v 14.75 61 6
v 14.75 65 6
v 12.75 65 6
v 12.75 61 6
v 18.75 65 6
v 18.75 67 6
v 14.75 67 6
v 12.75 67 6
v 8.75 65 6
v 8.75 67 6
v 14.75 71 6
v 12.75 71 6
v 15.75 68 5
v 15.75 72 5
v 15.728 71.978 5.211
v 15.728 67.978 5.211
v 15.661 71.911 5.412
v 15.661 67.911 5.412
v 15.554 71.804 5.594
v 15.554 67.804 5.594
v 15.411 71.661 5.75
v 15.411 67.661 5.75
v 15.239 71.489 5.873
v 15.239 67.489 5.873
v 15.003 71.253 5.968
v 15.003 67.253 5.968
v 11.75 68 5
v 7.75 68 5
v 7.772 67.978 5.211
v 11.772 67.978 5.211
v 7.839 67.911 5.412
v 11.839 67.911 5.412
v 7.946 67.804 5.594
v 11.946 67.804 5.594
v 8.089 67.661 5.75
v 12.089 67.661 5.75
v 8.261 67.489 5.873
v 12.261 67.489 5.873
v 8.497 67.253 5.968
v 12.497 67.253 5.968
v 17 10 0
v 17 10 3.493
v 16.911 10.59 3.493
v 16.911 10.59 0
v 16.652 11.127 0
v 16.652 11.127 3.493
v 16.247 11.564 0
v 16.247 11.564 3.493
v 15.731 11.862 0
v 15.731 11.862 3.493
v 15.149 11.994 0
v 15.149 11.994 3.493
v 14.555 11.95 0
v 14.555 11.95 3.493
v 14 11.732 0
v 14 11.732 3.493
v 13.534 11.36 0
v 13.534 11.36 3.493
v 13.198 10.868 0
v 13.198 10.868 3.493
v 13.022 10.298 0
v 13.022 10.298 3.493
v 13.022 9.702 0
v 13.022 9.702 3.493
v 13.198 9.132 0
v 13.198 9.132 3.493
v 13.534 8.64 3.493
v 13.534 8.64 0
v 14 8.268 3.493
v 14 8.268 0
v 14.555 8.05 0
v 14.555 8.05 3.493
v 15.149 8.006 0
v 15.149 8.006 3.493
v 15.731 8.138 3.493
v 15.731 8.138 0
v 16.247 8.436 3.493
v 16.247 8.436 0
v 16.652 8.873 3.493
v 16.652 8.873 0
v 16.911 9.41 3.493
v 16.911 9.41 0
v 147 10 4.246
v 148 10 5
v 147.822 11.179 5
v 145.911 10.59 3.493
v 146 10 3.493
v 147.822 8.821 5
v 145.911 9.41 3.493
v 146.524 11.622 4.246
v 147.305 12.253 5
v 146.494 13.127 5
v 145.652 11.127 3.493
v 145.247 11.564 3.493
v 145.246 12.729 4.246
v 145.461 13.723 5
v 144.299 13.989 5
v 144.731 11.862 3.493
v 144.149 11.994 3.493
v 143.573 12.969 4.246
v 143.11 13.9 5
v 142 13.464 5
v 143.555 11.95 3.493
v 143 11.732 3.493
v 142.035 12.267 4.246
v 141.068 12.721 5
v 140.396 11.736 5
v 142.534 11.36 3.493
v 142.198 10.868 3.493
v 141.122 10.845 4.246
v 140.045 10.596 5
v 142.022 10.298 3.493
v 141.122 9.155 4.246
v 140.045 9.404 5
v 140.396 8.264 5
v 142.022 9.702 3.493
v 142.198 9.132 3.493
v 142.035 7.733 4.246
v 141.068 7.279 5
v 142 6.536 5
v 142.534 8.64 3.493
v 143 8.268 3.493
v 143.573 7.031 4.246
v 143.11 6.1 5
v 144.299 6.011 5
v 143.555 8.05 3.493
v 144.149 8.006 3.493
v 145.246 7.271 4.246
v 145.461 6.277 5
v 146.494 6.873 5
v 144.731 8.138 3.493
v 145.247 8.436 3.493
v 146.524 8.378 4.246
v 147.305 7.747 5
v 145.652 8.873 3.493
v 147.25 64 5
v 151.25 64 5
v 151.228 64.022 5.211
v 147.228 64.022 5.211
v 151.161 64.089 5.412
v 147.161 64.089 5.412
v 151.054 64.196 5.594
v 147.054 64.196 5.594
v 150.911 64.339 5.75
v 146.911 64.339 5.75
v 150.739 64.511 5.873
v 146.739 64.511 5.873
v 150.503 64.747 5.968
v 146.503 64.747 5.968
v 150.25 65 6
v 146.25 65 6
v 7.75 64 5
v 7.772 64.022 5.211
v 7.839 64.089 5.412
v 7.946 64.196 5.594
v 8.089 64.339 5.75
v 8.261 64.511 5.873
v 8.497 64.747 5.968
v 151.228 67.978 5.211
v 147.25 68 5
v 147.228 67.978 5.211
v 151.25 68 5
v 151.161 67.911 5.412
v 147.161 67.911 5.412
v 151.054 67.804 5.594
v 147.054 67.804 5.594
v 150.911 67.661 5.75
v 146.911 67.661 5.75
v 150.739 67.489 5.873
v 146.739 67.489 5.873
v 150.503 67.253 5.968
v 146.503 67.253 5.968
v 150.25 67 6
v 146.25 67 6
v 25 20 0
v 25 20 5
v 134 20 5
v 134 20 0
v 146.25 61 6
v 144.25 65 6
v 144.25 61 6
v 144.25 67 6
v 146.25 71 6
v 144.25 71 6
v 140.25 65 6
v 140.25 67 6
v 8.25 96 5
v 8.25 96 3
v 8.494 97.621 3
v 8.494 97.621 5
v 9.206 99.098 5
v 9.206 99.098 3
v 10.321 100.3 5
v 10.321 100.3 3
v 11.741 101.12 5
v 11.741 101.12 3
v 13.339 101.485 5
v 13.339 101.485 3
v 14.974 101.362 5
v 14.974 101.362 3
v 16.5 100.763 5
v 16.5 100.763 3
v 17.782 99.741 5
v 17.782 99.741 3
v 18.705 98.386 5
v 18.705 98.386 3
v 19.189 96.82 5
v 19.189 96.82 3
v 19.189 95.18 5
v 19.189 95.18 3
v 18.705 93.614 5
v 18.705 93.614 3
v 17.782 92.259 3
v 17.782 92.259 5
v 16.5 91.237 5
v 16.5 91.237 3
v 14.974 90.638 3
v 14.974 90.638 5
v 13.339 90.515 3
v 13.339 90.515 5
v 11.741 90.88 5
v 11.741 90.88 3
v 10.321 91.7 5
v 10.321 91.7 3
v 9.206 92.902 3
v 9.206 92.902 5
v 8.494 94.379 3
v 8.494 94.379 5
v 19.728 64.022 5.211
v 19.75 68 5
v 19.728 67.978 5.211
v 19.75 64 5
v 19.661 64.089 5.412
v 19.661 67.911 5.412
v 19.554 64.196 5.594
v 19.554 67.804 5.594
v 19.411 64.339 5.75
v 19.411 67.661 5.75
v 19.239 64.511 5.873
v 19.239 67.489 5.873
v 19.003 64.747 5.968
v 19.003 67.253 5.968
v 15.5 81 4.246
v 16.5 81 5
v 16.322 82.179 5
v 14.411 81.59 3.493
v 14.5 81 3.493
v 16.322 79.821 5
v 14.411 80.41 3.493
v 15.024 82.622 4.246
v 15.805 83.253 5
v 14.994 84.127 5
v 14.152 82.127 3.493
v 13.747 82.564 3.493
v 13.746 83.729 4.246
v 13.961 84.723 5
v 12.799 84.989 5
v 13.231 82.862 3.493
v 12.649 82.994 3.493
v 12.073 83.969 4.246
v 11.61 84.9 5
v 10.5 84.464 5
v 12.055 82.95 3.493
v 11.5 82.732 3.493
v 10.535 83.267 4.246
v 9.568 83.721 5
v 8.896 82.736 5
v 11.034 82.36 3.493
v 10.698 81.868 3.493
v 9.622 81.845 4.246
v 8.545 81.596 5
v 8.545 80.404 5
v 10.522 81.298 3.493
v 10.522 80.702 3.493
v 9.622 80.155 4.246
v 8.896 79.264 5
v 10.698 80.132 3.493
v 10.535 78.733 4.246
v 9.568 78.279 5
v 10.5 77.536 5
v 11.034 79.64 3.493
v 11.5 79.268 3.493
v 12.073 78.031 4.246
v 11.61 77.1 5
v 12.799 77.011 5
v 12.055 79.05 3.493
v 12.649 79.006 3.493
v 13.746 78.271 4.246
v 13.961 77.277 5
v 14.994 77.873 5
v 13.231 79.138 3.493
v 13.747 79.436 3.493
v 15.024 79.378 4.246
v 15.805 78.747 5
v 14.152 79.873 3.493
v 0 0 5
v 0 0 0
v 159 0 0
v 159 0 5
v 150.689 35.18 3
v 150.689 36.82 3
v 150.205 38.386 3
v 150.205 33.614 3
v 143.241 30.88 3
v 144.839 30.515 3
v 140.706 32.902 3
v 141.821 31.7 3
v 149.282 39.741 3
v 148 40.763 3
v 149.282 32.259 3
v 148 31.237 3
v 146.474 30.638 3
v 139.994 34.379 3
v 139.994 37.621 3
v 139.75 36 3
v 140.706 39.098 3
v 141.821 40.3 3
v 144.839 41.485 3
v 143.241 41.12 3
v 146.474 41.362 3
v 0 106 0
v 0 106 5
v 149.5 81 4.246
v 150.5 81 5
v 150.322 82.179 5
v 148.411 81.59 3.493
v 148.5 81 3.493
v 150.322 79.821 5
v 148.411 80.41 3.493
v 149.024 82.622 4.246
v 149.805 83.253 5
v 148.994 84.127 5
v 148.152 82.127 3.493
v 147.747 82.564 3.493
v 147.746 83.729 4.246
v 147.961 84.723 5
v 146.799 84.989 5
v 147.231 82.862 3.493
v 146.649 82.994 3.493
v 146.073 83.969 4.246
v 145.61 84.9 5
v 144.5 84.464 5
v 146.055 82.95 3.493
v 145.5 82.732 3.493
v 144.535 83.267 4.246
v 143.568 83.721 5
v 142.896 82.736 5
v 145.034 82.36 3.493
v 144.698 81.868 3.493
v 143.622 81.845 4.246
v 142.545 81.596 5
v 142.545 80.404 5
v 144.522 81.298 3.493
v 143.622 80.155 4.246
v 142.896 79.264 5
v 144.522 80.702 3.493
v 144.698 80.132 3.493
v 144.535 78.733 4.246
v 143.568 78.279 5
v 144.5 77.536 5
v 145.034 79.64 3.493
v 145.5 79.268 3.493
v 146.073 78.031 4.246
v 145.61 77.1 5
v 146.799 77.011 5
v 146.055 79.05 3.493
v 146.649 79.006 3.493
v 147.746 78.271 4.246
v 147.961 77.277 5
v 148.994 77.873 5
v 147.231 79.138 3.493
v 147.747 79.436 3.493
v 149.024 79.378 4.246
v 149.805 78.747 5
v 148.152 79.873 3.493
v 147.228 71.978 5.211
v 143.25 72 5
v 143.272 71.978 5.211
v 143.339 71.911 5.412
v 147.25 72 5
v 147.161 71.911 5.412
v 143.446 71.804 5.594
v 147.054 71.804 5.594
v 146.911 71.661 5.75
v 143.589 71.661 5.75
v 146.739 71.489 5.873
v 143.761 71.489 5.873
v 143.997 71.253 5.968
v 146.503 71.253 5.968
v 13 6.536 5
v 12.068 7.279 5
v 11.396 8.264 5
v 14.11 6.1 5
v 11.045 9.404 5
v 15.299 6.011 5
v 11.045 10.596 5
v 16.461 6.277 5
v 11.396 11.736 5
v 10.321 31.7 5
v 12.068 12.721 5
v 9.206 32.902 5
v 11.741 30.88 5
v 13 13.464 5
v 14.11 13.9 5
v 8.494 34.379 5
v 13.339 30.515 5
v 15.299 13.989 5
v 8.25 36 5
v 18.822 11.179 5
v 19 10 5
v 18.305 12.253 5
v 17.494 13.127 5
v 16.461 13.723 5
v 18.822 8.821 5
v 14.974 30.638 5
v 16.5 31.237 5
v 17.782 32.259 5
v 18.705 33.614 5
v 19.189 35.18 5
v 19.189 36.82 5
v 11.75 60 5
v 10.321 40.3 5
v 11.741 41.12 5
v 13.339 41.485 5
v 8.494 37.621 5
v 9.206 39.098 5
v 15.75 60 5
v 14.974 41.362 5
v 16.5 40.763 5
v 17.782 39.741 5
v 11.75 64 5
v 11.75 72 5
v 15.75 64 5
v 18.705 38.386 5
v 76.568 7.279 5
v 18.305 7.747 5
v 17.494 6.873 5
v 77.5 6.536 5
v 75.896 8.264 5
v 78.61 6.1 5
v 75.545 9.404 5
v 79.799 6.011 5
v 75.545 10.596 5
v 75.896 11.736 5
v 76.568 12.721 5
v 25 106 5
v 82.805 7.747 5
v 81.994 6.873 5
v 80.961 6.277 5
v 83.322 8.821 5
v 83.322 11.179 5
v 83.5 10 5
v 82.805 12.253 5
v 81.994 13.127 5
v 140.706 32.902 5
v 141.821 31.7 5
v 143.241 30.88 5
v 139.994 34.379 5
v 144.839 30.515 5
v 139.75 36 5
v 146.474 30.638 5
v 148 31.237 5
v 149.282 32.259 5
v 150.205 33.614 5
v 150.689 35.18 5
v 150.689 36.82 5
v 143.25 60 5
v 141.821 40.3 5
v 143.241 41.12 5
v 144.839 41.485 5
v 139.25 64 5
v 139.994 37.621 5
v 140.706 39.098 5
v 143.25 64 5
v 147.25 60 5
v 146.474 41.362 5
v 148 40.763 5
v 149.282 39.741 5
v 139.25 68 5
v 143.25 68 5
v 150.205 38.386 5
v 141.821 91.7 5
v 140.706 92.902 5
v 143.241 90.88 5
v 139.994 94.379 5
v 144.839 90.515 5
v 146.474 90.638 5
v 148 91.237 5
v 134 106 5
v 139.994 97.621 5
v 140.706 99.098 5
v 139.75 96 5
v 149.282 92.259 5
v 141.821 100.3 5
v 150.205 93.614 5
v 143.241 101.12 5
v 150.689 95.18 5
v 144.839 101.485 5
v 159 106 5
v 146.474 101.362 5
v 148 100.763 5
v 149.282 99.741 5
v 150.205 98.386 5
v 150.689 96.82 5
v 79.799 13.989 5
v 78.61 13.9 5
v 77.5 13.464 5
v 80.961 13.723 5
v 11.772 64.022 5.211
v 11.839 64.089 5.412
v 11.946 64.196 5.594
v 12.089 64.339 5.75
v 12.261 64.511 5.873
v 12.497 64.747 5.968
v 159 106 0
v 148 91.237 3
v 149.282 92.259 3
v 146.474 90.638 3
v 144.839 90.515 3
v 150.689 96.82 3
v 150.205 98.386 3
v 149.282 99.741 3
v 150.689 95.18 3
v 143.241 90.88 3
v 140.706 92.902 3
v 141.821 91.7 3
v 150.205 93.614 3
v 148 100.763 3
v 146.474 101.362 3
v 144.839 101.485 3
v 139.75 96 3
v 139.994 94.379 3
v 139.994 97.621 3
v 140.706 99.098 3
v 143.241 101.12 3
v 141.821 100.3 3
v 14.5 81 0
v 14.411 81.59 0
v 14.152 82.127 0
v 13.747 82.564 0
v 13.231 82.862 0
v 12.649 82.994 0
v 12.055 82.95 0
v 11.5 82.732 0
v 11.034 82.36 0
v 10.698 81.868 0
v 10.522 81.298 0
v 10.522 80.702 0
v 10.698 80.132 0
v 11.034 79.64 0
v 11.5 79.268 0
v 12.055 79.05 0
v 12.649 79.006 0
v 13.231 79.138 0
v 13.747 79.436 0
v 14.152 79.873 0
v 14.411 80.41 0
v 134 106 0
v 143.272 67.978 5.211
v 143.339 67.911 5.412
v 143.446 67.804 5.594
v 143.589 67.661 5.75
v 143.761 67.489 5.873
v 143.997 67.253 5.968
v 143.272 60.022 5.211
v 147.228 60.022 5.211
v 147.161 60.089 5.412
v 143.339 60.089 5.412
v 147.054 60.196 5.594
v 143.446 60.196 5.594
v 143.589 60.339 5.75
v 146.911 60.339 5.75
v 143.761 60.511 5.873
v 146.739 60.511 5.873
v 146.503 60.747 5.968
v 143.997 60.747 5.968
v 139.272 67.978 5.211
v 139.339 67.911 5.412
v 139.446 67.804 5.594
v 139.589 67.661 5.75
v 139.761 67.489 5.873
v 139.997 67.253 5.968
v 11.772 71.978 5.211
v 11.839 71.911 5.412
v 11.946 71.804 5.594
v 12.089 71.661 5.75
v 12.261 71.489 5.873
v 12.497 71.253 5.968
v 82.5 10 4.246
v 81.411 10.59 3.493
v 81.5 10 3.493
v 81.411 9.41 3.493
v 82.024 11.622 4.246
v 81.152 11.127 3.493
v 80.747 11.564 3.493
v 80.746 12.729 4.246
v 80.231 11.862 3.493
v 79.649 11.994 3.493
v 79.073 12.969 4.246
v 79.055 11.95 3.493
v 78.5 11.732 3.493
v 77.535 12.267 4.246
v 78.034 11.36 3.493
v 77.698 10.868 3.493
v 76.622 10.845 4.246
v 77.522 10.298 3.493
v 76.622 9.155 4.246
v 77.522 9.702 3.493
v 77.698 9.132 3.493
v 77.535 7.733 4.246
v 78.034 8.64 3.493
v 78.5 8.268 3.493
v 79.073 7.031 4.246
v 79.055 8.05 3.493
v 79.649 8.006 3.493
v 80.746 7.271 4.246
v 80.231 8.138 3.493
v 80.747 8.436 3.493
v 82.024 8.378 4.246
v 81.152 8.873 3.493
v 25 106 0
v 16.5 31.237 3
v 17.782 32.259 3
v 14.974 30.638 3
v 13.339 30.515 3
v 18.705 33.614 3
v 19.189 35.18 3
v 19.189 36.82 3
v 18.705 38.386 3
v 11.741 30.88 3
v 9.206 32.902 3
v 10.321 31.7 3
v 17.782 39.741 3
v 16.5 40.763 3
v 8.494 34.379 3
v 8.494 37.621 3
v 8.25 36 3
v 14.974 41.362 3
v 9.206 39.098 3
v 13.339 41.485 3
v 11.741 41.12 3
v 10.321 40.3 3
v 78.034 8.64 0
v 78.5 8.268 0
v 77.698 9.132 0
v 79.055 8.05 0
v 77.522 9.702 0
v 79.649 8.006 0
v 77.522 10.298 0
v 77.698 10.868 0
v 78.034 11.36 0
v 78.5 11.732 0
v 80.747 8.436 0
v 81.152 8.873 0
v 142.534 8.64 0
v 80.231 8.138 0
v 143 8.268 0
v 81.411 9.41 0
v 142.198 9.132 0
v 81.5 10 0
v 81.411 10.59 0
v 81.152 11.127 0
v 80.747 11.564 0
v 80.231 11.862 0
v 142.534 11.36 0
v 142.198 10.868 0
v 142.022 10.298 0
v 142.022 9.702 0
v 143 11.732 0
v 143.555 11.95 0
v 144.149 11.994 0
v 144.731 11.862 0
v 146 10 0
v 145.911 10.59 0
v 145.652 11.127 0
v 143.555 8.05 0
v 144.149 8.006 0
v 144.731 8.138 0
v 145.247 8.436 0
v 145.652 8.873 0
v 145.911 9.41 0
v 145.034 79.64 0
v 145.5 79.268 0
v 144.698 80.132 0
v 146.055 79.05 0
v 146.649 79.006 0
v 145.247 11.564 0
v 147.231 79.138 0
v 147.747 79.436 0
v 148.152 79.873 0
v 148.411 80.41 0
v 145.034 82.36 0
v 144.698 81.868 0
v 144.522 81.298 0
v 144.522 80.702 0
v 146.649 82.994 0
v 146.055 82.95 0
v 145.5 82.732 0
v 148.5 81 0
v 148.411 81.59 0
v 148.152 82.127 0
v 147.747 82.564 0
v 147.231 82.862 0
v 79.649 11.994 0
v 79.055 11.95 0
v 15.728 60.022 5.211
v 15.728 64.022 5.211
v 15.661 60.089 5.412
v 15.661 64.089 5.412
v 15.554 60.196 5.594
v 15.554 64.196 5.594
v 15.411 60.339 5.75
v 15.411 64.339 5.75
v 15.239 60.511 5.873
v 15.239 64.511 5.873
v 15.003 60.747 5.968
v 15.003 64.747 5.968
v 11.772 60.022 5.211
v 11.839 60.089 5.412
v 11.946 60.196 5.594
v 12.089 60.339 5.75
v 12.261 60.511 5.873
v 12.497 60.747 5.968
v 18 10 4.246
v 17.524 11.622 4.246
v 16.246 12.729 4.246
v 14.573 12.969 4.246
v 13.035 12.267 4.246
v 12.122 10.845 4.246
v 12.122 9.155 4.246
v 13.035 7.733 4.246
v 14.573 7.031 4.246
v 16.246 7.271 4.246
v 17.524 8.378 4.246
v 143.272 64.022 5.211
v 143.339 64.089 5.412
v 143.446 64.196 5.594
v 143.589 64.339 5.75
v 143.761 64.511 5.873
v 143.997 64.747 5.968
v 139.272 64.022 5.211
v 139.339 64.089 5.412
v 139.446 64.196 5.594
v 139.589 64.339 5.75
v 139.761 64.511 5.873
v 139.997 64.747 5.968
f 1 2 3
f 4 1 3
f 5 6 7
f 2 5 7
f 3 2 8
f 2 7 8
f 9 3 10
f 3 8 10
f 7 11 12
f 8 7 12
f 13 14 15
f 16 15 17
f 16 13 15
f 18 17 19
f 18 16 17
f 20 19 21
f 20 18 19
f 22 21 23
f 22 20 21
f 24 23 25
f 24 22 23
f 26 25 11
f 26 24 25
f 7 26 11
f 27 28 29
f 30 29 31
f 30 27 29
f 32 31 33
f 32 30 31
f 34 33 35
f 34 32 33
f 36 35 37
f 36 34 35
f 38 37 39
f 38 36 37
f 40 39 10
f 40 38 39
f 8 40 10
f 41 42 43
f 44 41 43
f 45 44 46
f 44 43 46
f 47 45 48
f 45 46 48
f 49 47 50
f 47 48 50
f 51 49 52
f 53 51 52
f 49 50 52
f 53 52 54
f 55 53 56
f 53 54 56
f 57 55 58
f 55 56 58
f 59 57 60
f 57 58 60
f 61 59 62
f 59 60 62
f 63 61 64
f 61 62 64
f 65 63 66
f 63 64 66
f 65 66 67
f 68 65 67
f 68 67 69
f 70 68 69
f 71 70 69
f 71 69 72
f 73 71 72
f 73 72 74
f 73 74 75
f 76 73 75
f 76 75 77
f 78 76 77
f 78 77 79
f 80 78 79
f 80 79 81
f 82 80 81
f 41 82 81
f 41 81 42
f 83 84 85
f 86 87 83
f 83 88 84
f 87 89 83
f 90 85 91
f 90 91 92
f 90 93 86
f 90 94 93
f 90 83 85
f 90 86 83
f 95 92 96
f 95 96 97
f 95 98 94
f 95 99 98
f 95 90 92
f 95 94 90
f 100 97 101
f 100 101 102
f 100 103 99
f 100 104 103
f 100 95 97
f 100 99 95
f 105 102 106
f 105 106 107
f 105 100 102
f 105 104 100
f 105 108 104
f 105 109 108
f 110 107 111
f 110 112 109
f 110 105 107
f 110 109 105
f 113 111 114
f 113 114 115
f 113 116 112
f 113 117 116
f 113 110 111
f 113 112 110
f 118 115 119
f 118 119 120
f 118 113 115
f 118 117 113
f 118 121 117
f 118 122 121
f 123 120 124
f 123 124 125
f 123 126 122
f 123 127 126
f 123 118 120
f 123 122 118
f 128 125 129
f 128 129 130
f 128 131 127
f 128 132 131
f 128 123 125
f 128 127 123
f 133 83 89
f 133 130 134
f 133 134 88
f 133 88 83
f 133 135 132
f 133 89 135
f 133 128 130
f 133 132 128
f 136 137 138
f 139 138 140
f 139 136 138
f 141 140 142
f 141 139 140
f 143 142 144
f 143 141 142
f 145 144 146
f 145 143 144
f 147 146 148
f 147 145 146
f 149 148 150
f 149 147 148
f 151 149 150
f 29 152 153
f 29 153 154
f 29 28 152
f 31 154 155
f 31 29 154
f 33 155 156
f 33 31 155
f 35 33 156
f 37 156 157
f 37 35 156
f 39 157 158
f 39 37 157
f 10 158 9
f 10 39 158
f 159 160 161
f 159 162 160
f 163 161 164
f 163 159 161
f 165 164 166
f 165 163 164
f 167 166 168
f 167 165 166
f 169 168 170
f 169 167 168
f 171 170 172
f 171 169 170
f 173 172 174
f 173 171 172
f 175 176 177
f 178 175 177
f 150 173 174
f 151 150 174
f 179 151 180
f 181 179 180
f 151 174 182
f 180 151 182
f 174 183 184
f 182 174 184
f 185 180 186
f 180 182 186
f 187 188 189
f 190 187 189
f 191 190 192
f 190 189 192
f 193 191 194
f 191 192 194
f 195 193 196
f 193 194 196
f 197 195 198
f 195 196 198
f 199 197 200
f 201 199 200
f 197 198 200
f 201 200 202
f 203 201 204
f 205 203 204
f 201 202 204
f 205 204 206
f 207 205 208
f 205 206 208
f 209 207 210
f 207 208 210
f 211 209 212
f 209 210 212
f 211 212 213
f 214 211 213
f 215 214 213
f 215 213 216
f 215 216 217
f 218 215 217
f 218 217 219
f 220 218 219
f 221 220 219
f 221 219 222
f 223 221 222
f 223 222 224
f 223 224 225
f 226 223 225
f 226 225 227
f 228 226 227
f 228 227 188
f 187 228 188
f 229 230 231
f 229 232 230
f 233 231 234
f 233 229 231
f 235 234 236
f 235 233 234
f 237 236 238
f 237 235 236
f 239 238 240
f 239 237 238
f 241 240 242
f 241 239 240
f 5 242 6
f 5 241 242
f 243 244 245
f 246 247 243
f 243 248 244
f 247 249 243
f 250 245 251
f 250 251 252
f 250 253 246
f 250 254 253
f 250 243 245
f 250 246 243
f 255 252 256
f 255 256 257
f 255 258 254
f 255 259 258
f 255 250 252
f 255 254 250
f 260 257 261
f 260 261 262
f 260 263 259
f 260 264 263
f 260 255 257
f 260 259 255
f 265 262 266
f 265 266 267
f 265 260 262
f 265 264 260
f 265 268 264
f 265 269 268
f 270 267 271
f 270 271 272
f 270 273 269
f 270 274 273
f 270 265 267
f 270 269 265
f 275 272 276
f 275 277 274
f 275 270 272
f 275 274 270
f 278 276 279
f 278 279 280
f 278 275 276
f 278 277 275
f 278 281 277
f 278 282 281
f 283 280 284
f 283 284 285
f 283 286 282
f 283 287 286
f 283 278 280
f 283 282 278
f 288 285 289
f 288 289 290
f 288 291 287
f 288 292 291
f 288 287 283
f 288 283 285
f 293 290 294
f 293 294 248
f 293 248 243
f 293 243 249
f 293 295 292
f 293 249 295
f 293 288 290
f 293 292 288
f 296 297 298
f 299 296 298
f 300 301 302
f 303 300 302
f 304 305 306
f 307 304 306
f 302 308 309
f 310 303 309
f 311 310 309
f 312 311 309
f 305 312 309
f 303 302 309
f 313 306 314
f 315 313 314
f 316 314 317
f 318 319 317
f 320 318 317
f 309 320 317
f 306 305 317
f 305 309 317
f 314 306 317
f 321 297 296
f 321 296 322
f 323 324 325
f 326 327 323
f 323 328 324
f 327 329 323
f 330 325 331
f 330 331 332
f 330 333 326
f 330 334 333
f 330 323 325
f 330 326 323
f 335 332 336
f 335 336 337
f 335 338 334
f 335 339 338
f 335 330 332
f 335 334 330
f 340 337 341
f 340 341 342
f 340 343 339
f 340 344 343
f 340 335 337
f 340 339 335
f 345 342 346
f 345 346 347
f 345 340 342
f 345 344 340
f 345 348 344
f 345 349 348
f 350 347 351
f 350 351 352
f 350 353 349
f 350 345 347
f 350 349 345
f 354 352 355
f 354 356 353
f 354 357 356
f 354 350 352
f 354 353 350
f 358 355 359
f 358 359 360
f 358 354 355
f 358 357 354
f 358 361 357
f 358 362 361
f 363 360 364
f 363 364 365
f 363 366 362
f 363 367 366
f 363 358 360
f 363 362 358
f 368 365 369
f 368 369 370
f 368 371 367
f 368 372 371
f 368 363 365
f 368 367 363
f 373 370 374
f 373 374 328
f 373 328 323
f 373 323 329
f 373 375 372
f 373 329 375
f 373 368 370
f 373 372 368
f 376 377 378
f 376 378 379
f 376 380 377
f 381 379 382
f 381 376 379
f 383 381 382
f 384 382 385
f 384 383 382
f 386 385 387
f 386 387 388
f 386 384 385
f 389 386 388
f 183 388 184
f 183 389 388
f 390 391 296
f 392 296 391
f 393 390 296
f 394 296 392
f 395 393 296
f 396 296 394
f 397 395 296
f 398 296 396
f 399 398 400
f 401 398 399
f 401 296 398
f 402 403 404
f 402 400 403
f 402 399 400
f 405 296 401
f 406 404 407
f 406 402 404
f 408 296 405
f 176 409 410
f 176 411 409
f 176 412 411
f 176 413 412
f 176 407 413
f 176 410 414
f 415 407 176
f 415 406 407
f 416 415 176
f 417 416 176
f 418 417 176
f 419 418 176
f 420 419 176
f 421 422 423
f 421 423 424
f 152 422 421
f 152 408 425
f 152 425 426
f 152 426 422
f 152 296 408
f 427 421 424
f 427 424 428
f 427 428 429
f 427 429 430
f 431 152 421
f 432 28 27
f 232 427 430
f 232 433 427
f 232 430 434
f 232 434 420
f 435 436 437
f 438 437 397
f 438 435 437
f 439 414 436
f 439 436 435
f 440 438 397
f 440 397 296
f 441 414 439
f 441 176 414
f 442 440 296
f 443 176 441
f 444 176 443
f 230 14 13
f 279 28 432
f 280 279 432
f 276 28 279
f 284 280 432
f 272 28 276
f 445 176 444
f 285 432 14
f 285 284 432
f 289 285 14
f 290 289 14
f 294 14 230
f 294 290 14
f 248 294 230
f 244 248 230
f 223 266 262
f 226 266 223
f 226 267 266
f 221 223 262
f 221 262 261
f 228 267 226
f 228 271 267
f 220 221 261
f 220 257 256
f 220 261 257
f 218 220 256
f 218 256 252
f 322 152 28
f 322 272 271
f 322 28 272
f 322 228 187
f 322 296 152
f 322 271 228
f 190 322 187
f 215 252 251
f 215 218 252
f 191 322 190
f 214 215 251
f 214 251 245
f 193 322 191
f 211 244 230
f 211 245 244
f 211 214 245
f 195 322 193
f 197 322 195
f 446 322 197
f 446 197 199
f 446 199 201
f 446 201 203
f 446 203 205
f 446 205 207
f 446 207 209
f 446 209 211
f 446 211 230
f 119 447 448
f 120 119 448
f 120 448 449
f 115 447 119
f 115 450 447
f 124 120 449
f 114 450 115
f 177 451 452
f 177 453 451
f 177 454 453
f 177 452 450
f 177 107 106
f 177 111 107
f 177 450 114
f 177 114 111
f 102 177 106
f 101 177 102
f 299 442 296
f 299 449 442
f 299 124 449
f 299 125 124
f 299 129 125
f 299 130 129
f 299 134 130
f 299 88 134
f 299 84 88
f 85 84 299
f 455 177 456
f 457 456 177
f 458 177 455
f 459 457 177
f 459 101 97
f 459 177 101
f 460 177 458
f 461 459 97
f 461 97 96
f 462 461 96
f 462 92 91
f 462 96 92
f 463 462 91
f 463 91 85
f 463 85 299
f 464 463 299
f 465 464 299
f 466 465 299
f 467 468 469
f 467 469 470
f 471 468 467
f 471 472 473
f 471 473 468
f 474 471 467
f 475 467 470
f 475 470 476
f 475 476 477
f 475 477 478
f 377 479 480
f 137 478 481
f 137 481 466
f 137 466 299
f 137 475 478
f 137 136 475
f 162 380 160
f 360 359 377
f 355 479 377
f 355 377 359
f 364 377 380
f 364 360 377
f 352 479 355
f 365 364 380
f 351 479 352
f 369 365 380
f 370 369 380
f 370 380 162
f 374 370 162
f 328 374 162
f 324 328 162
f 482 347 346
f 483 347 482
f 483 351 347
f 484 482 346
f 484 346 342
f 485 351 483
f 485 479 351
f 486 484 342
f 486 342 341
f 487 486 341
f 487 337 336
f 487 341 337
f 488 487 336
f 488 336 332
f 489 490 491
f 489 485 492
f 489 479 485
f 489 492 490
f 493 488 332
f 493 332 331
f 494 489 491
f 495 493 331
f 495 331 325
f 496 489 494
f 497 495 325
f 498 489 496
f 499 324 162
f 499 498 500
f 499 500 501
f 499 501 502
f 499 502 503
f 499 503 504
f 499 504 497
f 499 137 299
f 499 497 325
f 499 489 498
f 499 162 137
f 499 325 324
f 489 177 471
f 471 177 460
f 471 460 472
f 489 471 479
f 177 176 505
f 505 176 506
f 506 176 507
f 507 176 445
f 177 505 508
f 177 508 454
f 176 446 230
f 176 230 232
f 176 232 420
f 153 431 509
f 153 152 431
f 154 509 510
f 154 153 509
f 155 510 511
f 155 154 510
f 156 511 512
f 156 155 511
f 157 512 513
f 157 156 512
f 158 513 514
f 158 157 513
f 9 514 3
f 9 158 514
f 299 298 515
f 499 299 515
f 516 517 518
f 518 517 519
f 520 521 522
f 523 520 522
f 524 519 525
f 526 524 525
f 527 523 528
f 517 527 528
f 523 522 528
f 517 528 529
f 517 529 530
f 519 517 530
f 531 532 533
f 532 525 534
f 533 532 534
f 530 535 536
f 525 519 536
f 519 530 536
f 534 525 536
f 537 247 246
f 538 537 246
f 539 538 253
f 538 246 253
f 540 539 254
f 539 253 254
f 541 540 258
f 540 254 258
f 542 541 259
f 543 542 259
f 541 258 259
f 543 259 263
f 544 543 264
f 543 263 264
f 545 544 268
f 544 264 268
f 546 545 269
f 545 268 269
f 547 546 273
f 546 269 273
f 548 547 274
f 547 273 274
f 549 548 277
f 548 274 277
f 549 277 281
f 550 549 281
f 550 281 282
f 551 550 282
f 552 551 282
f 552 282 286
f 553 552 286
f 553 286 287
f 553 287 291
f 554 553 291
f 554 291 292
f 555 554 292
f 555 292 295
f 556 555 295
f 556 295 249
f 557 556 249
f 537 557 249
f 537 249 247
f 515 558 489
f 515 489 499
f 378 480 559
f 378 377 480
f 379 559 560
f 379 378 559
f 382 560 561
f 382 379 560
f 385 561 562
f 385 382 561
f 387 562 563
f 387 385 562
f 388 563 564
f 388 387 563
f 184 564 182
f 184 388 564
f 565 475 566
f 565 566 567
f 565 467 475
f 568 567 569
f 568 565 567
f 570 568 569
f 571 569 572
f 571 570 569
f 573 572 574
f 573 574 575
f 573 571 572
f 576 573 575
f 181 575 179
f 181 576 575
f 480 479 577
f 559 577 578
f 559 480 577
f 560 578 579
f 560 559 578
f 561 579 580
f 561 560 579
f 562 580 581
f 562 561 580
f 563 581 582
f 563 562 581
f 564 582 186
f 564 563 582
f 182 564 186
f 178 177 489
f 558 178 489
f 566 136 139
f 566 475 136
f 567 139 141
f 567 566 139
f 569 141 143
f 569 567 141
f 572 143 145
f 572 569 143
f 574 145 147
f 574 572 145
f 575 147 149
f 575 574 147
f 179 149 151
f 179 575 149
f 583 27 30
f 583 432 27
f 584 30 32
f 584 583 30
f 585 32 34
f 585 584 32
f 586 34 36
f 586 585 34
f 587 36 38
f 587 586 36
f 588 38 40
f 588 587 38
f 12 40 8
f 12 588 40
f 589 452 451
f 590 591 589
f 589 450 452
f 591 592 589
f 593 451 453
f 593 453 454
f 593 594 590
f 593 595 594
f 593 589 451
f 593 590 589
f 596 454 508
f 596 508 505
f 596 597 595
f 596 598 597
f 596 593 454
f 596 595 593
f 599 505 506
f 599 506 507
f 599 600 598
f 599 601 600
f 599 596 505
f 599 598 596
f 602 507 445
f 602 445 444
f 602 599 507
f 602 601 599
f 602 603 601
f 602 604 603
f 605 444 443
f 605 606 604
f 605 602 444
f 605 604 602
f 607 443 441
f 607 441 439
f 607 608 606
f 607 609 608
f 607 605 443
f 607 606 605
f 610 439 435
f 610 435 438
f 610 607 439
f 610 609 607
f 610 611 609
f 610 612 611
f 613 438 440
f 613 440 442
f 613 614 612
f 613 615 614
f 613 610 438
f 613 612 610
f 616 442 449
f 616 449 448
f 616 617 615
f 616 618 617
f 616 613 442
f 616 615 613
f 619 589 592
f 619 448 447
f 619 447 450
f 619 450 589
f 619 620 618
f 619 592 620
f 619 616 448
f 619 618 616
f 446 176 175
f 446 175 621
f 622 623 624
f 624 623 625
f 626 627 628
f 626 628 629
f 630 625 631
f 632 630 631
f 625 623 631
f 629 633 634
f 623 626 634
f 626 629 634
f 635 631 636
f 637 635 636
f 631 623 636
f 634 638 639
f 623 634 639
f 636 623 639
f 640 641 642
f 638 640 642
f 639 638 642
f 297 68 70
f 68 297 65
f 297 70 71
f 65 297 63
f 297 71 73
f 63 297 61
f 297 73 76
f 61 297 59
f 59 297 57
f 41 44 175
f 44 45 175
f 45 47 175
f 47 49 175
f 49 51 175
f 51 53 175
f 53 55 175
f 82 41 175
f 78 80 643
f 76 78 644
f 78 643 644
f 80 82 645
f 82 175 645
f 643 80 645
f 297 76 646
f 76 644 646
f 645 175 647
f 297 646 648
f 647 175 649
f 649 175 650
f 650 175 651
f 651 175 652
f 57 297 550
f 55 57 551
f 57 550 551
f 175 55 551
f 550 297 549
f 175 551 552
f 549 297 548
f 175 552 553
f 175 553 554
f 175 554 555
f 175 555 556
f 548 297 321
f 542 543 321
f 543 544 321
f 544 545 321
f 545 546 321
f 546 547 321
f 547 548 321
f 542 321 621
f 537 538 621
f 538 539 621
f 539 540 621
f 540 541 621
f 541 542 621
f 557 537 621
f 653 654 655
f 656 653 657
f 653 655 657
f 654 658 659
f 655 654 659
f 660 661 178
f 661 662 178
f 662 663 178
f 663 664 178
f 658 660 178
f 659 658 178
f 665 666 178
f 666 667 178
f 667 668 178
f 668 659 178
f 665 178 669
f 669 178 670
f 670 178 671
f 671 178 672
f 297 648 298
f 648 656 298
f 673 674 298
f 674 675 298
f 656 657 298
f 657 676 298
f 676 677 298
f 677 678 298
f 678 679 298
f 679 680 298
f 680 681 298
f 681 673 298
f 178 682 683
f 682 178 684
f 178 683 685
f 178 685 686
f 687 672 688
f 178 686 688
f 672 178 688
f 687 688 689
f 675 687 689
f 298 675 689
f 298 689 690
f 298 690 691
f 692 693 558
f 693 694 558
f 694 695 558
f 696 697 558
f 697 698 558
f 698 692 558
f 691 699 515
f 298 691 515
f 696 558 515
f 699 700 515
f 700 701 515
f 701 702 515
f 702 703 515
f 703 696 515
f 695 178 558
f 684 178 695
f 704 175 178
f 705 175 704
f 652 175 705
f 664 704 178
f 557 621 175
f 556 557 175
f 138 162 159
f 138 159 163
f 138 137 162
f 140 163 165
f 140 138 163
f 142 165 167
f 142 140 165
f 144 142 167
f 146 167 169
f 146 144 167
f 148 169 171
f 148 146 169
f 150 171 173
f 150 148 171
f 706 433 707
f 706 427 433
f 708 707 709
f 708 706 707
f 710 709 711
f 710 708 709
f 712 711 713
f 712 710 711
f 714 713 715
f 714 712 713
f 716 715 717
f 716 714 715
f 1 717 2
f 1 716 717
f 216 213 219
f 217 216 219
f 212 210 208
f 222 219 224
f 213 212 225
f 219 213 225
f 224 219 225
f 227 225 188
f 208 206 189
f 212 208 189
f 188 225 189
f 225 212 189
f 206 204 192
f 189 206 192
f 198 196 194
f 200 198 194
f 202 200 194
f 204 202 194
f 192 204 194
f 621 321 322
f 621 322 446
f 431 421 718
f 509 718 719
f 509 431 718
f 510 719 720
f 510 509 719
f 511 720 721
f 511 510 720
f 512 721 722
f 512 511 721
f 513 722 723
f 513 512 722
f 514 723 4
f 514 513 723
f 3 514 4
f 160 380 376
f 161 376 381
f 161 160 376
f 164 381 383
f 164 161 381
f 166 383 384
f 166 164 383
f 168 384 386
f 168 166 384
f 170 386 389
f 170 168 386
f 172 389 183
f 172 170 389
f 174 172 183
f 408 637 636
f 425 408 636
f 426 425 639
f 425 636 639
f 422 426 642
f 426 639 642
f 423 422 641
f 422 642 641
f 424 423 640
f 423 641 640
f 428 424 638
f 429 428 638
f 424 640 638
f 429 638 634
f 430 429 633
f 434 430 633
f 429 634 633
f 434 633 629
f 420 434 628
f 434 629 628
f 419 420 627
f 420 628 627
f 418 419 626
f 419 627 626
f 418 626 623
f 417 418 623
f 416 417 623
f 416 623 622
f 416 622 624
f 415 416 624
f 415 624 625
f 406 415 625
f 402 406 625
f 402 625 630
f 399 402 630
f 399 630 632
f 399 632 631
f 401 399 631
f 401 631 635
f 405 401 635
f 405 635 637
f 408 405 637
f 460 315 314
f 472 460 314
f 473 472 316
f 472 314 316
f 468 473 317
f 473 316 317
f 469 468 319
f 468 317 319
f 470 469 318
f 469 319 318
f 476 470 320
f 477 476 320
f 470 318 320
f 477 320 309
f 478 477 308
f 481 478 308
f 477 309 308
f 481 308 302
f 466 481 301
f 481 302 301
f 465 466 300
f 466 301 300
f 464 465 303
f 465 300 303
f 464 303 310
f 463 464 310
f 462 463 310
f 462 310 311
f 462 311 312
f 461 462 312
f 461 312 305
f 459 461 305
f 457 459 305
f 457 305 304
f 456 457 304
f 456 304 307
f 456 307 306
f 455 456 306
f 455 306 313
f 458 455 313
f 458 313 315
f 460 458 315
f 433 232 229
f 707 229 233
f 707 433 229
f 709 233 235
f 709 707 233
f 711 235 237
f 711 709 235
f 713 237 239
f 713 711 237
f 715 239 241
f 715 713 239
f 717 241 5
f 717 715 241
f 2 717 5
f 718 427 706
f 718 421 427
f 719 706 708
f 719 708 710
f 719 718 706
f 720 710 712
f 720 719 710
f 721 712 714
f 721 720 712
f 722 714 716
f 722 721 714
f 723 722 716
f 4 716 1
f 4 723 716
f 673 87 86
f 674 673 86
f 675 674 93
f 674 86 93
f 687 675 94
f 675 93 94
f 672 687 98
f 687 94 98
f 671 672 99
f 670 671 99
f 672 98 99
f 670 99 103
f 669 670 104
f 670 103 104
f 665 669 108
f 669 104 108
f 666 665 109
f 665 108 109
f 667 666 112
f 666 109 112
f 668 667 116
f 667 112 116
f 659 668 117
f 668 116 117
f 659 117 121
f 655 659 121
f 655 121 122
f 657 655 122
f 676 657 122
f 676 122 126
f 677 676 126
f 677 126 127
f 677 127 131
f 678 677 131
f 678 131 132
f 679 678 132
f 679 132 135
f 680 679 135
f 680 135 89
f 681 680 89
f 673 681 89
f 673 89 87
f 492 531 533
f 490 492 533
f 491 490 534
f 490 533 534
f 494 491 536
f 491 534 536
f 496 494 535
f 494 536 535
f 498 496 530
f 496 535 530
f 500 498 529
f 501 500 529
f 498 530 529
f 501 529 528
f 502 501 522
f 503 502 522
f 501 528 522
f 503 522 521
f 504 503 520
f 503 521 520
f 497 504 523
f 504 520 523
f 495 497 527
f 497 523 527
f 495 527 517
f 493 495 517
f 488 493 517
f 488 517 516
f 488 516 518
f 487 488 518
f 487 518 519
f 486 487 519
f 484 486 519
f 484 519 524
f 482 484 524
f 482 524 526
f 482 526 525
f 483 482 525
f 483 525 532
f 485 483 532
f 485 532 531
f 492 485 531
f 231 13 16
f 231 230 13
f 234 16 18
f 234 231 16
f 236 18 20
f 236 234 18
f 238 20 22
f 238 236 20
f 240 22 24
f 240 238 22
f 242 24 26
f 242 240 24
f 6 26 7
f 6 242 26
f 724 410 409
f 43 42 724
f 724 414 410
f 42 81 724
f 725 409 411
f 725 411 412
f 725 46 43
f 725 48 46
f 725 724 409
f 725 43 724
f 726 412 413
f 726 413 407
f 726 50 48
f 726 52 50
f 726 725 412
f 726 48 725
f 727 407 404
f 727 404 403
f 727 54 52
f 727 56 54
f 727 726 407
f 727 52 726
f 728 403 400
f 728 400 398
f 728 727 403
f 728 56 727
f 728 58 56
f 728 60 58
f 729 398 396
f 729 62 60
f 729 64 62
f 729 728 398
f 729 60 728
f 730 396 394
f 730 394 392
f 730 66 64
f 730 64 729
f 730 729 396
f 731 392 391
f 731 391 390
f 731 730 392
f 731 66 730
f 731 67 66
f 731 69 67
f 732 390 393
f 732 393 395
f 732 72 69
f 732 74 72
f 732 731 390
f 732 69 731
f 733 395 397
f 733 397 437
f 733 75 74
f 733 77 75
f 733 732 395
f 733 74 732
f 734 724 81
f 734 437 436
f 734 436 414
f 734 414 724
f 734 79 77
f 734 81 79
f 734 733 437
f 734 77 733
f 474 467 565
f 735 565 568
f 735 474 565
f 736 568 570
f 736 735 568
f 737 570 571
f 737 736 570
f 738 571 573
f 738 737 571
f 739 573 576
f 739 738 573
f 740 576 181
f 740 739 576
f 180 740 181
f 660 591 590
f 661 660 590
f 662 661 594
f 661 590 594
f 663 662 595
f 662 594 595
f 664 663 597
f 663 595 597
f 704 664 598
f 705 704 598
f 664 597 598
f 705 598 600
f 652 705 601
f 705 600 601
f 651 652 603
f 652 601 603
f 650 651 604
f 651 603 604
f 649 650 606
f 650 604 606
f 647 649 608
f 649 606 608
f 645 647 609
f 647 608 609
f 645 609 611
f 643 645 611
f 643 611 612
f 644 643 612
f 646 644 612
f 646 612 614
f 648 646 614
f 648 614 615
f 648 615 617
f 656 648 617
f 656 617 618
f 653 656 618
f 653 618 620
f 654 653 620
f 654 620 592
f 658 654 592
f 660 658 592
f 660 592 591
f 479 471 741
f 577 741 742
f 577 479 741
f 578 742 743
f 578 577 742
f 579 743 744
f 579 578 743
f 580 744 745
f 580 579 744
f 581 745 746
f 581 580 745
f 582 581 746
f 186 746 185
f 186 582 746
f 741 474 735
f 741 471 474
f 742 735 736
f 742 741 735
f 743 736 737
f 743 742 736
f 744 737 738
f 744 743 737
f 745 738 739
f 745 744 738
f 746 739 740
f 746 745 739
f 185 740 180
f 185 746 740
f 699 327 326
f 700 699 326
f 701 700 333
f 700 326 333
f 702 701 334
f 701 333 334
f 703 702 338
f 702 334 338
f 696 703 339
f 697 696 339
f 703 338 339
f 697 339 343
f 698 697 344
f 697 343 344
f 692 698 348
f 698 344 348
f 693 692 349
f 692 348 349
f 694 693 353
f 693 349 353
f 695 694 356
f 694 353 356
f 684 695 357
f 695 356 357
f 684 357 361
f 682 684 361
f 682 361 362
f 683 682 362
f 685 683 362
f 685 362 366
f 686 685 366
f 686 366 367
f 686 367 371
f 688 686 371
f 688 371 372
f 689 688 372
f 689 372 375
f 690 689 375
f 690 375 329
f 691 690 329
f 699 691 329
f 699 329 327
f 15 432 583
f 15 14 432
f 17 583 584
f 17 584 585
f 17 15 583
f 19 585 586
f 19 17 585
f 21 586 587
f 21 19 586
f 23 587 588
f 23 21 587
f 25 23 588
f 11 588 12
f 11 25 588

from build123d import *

# Parameters (mm, degrees)
ESQUISSE1_W             = 159
ESQUISSE1_H             = 106
BOSS_EXTRU_1_DEPTH      = 5
ENL_V_START             = -3
ESQUISSE3_R             = 5.5
ENL_V_MAT_EXTRU_2_DEPTH = 2.2
ESQUISSE4_W             = 109
ESQUISSE4_H             = 86
ENL_V_MAT_EXTRU_3_DEPTH = 6
ESQUISSE5_R             = 2
ENL_V_MAT_EXTRU_4_DEPTH = 6
CHANFREIN1_SIZE         = 2
CHANFREIN1_SIZE2        = 1.5071081
BOSS_EXTRU_2_START      = -5
BOSS_EXTRU_2_DEPTH      = 1
CONG_2_R                = 1


with BuildPart() as part:
    # Esquisse1 → Boss.-Extru.1 (new body)
    with BuildSketch(Plane.XY):
        with Locations((79.5, 53)):
            Rectangle(ESQUISSE1_W, ESQUISSE1_H)
    extrude(amount=BOSS_EXTRU_1_DEPTH)

    # Esquisse3 → Enlèv. mat.-Extru.2 (cut)
    with BuildSketch(Plane(origin=(0, 0, 0), x_dir=(-1, 0, 0), z_dir=(0, 0, -1)).offset(ENL_V_START)):
        with Locations((-13.75, 36)):
            Circle(ESQUISSE3_R)
        with Locations((-13.75, 96)):
            Circle(ESQUISSE3_R)
        with Locations((-145.25, 36)):
            Circle(ESQUISSE3_R)
        with Locations((-145.25, 96)):
            Circle(ESQUISSE3_R)
    extrude(amount=-ENL_V_MAT_EXTRU_2_DEPTH, mode=Mode.SUBTRACT)

    # Esquisse4 → Enlèv. mat.-Extru.3 (cut)
    with BuildSketch(Plane.XY.offset(5)):
        with Locations((79.5, 63)):
            Rectangle(ESQUISSE4_W, ESQUISSE4_H)
    extrude(amount=-ENL_V_MAT_EXTRU_3_DEPTH, mode=Mode.SUBTRACT)

    # Esquisse5 → Enlèv. mat.-Extru.4 (cut)
    with BuildSketch(Plane.XY.offset(5)):
        with Locations((15, 10)):
            Circle(ESQUISSE5_R)
        with Locations((144, 10)):
            Circle(ESQUISSE5_R)
        with Locations((12.5, 81)):
            Circle(ESQUISSE5_R)
        with Locations((146.5, 81)):
            Circle(ESQUISSE5_R)
        with Locations((79.5, 10)):
            Circle(ESQUISSE5_R)
    extrude(amount=-ENL_V_MAT_EXTRU_4_DEPTH, mode=Mode.SUBTRACT)

    # Chanfrein1
    chanfrein1_edges = [part.edges().sort_by_distance(p)[0] for p in [
        (13, 10, 5),
        (142, 10, 5),
        (10.5, 81, 5),
        (144.5, 81, 5),
        (77.5, 10, 5),
    ]]
    chanfrein1_side = [part.faces().sort_by_distance(p)[0] for p in [
        (1.910942176, 53, 5),
    ]]
    chamfer(chanfrein1_edges, length=CHANFREIN1_SIZE, length2=CHANFREIN1_SIZE2, reference=chanfrein1_side[0])

    # Esquisse2 → Boss.-Extru.2 (add)
    with BuildSketch(Plane(origin=(0, 0, 0), x_dir=(-1, 0, 0), z_dir=(0, 0, -1)).offset(BOSS_EXTRU_2_START)):
        Polygon((-11.75, 64), (-7.75, 64), (-7.75, 68), (-11.75, 68), (-11.75, 72), (-15.75, 72), (-15.75, 68), (-19.75, 68), (-19.75, 64), (-15.75, 64), (-15.75, 60), (-11.75, 60), align=None)
        Polygon((-143.25, 64), (-139.25, 64), (-139.25, 68), (-143.25, 68), (-143.25, 72), (-147.25, 72), (-147.25, 68), (-151.25, 68), (-151.25, 64), (-147.25, 64), (-147.25, 60), (-143.25, 60), align=None)
    extrude(amount=-BOSS_EXTRU_2_DEPTH)

    # Congé2
    cong_2_edges = [part.edges().sort_by_distance(p)[0] for p in [
        (11.75, 62, 6),
        (13.75, 60, 6),
        (15.75, 62, 6),
        (19.75, 66, 6),
        (17.75, 64, 6),
        (17.75, 68, 6),
        (15.75, 70, 6),
        (13.75, 72, 6),
        (11.75, 70, 6),
        (143.25, 70, 6),
        (145.25, 72, 6),
        (147.25, 70, 6),
        (149.25, 68, 6),
        (151.25, 66, 6),
        (149.25, 64, 6),
        (147.25, 62, 6),
        (145.25, 60, 6),
        (143.25, 62, 6),
        (141.25, 64, 6),
        (141.25, 68, 6),
        (139.25, 66, 6),
        (9.75, 68, 6),
        (7.75, 66, 6),
        (9.75, 64, 6),
    ]]
    fillet(cong_2_edges, radius=CONG_2_R - 0.0001)  # a hair under: the kernel refuses the full size


solid = part.part
